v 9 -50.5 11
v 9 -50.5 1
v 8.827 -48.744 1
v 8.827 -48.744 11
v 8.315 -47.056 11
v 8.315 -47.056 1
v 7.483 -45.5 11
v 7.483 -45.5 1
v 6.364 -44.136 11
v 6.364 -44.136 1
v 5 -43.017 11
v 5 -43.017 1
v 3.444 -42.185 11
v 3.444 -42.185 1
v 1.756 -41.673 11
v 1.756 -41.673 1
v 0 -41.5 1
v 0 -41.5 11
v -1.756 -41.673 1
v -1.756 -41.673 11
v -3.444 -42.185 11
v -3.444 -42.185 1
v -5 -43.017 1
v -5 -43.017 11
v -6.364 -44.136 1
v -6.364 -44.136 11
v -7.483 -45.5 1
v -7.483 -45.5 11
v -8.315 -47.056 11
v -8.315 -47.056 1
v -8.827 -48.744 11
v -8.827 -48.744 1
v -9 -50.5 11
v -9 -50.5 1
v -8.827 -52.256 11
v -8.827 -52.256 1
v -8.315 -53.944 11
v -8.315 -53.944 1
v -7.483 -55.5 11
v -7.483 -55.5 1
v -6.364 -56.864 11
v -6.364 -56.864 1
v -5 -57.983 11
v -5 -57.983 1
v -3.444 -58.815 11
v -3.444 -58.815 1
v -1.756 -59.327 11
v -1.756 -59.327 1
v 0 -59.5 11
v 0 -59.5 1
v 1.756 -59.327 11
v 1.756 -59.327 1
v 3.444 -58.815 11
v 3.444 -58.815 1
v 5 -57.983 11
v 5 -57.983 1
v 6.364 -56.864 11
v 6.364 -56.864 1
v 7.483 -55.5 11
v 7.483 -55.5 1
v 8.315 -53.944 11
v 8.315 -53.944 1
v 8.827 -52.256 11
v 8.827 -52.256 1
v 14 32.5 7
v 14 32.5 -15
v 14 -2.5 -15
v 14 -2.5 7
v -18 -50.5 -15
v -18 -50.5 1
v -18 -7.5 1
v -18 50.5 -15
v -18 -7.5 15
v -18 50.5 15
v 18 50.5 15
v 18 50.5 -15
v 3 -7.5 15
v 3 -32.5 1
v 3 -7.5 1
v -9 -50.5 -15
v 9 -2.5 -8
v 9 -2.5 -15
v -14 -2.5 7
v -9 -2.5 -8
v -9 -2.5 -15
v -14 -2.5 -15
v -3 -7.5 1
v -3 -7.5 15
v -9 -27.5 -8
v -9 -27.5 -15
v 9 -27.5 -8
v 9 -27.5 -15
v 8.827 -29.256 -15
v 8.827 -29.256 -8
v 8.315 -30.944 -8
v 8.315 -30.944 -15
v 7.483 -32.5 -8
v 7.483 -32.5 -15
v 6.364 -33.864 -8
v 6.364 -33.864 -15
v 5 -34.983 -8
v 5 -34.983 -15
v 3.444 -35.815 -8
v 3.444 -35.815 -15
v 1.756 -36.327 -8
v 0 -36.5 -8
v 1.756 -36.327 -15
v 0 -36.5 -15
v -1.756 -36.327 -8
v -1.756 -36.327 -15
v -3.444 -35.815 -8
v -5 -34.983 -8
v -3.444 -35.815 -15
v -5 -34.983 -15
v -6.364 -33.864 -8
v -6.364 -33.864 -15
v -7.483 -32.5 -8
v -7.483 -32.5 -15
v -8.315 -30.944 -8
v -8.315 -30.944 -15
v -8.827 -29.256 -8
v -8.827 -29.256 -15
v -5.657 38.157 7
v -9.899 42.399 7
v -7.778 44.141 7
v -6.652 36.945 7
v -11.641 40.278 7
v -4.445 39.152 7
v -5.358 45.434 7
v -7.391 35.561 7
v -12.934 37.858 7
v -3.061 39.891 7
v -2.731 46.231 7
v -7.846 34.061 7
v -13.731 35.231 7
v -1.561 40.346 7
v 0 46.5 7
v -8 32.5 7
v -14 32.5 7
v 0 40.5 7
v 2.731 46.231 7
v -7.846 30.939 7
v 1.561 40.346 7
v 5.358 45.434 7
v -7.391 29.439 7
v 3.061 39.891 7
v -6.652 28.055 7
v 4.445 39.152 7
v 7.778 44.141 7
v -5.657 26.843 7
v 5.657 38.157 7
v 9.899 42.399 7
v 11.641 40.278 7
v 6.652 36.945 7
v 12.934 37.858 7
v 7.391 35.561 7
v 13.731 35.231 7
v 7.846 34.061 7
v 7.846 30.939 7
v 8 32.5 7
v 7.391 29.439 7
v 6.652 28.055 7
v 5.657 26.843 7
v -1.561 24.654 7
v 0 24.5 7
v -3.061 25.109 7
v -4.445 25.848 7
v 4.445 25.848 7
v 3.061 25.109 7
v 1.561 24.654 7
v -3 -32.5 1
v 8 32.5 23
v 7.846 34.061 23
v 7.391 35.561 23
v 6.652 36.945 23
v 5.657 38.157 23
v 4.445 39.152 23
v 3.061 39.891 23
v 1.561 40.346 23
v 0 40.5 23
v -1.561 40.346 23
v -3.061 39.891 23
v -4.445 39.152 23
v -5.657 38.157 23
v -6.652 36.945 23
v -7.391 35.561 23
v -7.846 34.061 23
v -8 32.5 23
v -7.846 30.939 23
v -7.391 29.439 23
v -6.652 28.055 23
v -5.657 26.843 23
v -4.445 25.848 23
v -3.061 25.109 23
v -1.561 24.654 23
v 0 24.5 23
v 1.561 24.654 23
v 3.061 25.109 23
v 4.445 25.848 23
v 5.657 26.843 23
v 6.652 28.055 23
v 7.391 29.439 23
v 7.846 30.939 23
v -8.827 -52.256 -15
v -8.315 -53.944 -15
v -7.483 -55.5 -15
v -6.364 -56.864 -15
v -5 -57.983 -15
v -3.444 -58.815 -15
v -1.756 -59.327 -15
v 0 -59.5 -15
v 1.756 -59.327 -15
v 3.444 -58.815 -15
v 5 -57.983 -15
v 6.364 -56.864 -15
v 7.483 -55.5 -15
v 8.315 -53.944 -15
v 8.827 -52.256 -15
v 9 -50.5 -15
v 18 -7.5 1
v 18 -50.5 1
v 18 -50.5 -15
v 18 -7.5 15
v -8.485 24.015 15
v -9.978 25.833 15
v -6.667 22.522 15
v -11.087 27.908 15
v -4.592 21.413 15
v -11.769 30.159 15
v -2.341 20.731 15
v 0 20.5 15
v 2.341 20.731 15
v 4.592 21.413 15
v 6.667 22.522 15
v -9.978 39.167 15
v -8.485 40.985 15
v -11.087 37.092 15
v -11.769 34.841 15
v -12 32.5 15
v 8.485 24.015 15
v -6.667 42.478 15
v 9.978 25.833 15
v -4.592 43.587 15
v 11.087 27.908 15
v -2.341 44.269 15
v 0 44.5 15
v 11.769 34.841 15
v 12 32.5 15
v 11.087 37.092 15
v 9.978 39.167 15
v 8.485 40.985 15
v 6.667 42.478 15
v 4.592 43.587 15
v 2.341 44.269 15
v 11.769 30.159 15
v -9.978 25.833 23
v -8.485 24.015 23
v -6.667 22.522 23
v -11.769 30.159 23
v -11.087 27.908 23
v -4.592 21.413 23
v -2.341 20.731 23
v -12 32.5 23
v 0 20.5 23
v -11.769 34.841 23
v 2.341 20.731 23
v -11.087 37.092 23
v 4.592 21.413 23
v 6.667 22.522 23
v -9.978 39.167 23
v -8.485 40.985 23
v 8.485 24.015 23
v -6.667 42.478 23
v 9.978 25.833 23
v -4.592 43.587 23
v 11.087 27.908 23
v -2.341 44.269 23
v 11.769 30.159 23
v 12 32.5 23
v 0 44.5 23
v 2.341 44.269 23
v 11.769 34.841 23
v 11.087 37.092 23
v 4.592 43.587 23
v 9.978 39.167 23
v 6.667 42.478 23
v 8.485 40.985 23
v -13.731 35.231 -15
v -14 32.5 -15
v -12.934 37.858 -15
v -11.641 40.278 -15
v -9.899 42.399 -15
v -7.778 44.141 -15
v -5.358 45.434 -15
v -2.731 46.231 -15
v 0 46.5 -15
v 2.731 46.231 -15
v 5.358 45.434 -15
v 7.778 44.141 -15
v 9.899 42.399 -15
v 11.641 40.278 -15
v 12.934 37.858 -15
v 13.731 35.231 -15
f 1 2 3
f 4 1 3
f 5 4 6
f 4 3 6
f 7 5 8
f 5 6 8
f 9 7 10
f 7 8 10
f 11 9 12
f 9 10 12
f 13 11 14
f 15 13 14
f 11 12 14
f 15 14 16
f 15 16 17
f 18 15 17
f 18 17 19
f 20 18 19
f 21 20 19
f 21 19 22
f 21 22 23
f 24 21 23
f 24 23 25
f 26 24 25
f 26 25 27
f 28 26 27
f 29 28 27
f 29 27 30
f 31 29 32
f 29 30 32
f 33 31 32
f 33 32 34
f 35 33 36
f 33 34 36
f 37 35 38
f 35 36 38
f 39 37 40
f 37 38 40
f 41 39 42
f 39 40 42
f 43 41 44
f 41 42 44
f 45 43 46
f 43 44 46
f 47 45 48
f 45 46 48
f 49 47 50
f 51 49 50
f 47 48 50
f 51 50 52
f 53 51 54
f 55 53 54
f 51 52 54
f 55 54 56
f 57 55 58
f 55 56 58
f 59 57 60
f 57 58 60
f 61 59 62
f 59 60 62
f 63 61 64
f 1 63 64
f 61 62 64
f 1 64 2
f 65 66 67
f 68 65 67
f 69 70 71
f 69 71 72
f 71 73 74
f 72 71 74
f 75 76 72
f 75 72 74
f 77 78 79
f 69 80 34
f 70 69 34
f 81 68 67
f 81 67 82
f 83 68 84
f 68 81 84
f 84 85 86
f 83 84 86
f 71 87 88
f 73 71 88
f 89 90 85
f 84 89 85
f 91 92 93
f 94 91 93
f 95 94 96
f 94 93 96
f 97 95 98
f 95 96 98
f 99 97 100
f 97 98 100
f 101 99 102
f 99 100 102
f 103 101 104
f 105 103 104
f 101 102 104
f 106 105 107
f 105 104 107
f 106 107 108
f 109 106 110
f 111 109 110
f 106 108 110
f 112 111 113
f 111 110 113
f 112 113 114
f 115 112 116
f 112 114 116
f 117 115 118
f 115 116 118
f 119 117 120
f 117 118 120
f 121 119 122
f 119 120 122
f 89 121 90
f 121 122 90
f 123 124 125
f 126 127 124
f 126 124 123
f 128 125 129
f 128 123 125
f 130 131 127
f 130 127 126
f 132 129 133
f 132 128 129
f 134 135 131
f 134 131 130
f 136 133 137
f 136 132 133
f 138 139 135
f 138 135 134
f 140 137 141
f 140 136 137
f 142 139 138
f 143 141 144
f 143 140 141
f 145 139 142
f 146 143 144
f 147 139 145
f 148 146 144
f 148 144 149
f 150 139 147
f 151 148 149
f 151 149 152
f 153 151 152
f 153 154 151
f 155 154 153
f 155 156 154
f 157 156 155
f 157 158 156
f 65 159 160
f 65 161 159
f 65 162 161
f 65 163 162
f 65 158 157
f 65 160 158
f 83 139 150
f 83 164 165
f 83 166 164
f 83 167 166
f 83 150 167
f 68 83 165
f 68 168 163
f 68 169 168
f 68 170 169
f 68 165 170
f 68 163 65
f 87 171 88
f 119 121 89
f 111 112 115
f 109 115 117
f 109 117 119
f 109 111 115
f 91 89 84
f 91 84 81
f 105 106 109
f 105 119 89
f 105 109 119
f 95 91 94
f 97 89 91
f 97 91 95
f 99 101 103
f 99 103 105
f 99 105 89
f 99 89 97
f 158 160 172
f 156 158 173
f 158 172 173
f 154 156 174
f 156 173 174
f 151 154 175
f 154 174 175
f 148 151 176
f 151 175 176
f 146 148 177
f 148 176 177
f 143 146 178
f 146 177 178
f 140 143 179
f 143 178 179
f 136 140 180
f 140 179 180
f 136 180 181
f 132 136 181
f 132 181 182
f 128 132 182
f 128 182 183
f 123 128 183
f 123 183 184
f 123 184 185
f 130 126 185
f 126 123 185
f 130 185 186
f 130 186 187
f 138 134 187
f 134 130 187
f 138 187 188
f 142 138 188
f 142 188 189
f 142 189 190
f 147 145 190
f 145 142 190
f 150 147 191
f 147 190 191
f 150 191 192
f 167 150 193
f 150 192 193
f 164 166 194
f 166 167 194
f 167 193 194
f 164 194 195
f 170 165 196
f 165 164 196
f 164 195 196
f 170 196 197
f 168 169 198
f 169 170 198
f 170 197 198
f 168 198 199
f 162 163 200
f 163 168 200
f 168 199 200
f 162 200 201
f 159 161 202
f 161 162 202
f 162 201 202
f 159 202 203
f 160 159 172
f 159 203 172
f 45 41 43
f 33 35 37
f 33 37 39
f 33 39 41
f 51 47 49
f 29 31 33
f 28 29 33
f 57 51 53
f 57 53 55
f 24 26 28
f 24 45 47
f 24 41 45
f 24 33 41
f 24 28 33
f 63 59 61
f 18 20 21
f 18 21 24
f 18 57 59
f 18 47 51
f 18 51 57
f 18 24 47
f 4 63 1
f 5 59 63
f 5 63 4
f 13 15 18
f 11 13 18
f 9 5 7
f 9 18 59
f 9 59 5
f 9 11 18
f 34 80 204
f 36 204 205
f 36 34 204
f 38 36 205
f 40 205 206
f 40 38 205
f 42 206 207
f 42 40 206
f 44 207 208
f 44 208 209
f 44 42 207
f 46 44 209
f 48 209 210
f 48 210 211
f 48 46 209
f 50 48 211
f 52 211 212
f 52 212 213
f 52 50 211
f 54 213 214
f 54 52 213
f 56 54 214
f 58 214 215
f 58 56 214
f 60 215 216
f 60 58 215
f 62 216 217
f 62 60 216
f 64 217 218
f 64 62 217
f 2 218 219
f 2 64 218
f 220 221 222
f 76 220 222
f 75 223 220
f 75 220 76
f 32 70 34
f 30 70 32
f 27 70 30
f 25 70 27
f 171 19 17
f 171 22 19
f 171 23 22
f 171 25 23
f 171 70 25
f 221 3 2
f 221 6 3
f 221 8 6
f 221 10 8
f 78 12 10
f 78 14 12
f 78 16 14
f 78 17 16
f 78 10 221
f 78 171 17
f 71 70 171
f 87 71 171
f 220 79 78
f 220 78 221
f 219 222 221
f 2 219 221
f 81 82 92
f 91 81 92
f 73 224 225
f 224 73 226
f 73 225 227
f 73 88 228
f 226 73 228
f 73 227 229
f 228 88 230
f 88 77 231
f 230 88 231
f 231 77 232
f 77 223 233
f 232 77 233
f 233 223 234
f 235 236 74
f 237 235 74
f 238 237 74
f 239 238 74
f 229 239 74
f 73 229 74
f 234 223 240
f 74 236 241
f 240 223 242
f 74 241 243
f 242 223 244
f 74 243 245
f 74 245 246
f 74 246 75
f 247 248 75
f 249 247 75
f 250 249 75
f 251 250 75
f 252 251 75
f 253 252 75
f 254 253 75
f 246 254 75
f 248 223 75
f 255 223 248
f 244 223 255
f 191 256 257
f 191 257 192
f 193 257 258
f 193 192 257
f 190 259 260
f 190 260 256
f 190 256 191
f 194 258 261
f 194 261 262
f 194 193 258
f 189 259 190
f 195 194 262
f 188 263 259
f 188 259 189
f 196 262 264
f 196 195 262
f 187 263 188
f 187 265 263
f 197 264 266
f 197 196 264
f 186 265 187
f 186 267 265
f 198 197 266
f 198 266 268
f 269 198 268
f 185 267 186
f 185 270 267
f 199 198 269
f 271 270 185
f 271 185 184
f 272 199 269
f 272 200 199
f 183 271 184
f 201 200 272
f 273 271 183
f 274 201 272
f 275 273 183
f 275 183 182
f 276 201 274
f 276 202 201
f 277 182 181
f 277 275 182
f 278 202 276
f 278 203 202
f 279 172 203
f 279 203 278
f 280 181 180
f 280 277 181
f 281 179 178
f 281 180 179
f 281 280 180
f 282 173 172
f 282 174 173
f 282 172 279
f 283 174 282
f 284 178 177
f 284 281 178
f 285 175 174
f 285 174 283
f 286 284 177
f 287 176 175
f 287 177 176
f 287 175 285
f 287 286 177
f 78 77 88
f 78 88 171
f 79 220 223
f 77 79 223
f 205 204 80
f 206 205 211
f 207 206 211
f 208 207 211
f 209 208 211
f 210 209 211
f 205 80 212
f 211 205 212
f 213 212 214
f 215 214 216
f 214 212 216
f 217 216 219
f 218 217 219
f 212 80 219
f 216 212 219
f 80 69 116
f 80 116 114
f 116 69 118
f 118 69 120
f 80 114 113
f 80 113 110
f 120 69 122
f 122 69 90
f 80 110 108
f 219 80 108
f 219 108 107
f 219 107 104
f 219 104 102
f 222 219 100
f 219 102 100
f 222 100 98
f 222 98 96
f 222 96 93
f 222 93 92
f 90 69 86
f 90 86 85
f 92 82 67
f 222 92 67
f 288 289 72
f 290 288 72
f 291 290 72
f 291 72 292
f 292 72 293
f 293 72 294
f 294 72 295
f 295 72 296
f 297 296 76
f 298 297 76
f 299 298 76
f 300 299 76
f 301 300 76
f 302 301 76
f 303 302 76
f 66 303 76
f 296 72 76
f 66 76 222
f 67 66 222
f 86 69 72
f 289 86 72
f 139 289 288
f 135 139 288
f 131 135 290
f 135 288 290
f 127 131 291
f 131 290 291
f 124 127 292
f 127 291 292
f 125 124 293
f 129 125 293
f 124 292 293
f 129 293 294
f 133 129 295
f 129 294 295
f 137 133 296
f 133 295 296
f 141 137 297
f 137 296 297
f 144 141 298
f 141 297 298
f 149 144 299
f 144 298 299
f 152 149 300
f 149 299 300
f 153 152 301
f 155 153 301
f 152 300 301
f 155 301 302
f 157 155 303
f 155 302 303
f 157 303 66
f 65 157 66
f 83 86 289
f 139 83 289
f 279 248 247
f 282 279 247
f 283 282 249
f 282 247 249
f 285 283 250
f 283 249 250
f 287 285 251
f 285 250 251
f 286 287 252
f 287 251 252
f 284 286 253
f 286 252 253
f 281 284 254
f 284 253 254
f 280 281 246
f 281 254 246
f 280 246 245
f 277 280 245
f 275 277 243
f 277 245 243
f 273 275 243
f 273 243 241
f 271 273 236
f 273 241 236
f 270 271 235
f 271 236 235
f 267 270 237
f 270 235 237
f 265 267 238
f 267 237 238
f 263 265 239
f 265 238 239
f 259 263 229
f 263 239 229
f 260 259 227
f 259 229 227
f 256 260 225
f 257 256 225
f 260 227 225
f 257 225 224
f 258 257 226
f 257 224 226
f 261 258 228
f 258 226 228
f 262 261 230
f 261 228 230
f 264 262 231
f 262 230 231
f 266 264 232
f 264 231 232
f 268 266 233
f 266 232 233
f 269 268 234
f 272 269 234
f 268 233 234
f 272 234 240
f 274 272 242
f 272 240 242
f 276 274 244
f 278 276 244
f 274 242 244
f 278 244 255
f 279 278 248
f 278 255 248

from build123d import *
from build123d import SkipClean  # not in build123d's __all__

# Parameters (mm, degrees)
F0_W      = 101
F0_H      = 30
F1_DEPTH  = 18
F2_R      = 12
F3_DEPTH  = 8
F4_R      = 8
F5_DEPTH  = 38.001
F6_W      = 43
F6_H      = 14
F7_DEPTH  = 36.001
F9_DEPTH  = 16
F8_R      = 9
F10_DEPTH = 10
F12_DEPTH = 3
F13_R     = 8
F14_DEPTH = 22
F16_DEPTH = 7


# Not quite as in the source:
# - after a boolean that leaves OpenCascade's solid faulty, fix() repairs it


with BuildPart() as f1:
    # F0 (on Right) → F1 (new body, symmetric)
    with BuildSketch(Plane.YZ):
        Rectangle(F0_W, F0_H)
    extrude(amount=F1_DEPTH, both=True)

    # F2 (on face) → F3 (join)
    with BuildSketch(Plane.XY.offset(15)):
        with Locations((0, 32.5)):
            Circle(F2_R)
    extrude(amount=F3_DEPTH)

    # F4 (on face) → F5 (cut, through all)
    with BuildSketch(Plane.XY.offset(23)):
        with Locations((0, 32.5)):
            Circle(F4_R)
    extrude(amount=-F5_DEPTH, mode=Mode.SUBTRACT)

    # F6 (on face) → F7 (cut, through all)
    with BuildSketch(Plane.YZ.offset(18)):
        with Locations((-29, 8)):
            Rectangle(F6_W, F6_H)
    extrude(amount=-F7_DEPTH, mode=Mode.SUBTRACT)

    # F8 (on face) → F9 (join)
    with BuildSketch(Plane.XY.offset(1)):
        with BuildLine():
            Line((-9, -50.5), (9, -50.5))
            ThreePointArc((9, -50.5), (0, -41.5), (-9, -50.5))
        make_face()
        with BuildLine():
            ThreePointArc((-9, -50.5), (0, -59.5), (9, -50.5))
            Line((9, -50.5), (-9, -50.5))
        make_face()
    extrude(amount=-F9_DEPTH)

    # F8 (on face) → F10 (join)
    with BuildSketch(Plane.XY.offset(1)):
        with Locations((0, -50.5)):
            Circle(F8_R)
    with SkipClean():  # cleaning this boolean's faces spoils the solid; the shape is the same uncleaned
        extrude(amount=F10_DEPTH)

    # F11 (on Right) → F12 (join, symmetric)
    with BuildSketch(Plane.YZ):
        Polygon((-7.5, 1), (-7.5, 15), (-32.5, 1), align=None)
    extrude(amount=F12_DEPTH, both=True)

    add(f1.part.fix(), mode=Mode.REPLACE)

    # F13 (on face) → F14 (cut)
    with BuildSketch(Plane(origin=(0, 0, -15), x_dir=(1, 0, 0), z_dir=(0, 0, -1))):
        with BuildLine():
            Line((-14, 2.5), (-14, -32.5))
            ThreePointArc((-14, -32.5), (0, -46.5), (14, -32.5))
            Line((14, -32.5), (14, 2.5))
            Line((14, 2.5), (-14, 2.5))
        make_face()
        with Locations((0, -32.5)):
            Circle(F13_R, mode=Mode.SUBTRACT)
    extrude(amount=-F14_DEPTH, mode=Mode.SUBTRACT)

    # F15 (on face) → F16 (cut)
    with BuildSketch(Plane(origin=(0, 0, -15), x_dir=(1, 0, 0), z_dir=(0, 0, -1))):
        with BuildLine():
            Line((9, 2.5), (9, 27.5))
            ThreePointArc((9, 27.5), (0, 36.5), (-9, 27.5))
            Line((-9, 27.5), (-9, 2.5))
            Line((-9, 2.5), (9, 2.5))
        make_face()
    extrude(amount=-F16_DEPTH, mode=Mode.SUBTRACT)


solid = f1.part
